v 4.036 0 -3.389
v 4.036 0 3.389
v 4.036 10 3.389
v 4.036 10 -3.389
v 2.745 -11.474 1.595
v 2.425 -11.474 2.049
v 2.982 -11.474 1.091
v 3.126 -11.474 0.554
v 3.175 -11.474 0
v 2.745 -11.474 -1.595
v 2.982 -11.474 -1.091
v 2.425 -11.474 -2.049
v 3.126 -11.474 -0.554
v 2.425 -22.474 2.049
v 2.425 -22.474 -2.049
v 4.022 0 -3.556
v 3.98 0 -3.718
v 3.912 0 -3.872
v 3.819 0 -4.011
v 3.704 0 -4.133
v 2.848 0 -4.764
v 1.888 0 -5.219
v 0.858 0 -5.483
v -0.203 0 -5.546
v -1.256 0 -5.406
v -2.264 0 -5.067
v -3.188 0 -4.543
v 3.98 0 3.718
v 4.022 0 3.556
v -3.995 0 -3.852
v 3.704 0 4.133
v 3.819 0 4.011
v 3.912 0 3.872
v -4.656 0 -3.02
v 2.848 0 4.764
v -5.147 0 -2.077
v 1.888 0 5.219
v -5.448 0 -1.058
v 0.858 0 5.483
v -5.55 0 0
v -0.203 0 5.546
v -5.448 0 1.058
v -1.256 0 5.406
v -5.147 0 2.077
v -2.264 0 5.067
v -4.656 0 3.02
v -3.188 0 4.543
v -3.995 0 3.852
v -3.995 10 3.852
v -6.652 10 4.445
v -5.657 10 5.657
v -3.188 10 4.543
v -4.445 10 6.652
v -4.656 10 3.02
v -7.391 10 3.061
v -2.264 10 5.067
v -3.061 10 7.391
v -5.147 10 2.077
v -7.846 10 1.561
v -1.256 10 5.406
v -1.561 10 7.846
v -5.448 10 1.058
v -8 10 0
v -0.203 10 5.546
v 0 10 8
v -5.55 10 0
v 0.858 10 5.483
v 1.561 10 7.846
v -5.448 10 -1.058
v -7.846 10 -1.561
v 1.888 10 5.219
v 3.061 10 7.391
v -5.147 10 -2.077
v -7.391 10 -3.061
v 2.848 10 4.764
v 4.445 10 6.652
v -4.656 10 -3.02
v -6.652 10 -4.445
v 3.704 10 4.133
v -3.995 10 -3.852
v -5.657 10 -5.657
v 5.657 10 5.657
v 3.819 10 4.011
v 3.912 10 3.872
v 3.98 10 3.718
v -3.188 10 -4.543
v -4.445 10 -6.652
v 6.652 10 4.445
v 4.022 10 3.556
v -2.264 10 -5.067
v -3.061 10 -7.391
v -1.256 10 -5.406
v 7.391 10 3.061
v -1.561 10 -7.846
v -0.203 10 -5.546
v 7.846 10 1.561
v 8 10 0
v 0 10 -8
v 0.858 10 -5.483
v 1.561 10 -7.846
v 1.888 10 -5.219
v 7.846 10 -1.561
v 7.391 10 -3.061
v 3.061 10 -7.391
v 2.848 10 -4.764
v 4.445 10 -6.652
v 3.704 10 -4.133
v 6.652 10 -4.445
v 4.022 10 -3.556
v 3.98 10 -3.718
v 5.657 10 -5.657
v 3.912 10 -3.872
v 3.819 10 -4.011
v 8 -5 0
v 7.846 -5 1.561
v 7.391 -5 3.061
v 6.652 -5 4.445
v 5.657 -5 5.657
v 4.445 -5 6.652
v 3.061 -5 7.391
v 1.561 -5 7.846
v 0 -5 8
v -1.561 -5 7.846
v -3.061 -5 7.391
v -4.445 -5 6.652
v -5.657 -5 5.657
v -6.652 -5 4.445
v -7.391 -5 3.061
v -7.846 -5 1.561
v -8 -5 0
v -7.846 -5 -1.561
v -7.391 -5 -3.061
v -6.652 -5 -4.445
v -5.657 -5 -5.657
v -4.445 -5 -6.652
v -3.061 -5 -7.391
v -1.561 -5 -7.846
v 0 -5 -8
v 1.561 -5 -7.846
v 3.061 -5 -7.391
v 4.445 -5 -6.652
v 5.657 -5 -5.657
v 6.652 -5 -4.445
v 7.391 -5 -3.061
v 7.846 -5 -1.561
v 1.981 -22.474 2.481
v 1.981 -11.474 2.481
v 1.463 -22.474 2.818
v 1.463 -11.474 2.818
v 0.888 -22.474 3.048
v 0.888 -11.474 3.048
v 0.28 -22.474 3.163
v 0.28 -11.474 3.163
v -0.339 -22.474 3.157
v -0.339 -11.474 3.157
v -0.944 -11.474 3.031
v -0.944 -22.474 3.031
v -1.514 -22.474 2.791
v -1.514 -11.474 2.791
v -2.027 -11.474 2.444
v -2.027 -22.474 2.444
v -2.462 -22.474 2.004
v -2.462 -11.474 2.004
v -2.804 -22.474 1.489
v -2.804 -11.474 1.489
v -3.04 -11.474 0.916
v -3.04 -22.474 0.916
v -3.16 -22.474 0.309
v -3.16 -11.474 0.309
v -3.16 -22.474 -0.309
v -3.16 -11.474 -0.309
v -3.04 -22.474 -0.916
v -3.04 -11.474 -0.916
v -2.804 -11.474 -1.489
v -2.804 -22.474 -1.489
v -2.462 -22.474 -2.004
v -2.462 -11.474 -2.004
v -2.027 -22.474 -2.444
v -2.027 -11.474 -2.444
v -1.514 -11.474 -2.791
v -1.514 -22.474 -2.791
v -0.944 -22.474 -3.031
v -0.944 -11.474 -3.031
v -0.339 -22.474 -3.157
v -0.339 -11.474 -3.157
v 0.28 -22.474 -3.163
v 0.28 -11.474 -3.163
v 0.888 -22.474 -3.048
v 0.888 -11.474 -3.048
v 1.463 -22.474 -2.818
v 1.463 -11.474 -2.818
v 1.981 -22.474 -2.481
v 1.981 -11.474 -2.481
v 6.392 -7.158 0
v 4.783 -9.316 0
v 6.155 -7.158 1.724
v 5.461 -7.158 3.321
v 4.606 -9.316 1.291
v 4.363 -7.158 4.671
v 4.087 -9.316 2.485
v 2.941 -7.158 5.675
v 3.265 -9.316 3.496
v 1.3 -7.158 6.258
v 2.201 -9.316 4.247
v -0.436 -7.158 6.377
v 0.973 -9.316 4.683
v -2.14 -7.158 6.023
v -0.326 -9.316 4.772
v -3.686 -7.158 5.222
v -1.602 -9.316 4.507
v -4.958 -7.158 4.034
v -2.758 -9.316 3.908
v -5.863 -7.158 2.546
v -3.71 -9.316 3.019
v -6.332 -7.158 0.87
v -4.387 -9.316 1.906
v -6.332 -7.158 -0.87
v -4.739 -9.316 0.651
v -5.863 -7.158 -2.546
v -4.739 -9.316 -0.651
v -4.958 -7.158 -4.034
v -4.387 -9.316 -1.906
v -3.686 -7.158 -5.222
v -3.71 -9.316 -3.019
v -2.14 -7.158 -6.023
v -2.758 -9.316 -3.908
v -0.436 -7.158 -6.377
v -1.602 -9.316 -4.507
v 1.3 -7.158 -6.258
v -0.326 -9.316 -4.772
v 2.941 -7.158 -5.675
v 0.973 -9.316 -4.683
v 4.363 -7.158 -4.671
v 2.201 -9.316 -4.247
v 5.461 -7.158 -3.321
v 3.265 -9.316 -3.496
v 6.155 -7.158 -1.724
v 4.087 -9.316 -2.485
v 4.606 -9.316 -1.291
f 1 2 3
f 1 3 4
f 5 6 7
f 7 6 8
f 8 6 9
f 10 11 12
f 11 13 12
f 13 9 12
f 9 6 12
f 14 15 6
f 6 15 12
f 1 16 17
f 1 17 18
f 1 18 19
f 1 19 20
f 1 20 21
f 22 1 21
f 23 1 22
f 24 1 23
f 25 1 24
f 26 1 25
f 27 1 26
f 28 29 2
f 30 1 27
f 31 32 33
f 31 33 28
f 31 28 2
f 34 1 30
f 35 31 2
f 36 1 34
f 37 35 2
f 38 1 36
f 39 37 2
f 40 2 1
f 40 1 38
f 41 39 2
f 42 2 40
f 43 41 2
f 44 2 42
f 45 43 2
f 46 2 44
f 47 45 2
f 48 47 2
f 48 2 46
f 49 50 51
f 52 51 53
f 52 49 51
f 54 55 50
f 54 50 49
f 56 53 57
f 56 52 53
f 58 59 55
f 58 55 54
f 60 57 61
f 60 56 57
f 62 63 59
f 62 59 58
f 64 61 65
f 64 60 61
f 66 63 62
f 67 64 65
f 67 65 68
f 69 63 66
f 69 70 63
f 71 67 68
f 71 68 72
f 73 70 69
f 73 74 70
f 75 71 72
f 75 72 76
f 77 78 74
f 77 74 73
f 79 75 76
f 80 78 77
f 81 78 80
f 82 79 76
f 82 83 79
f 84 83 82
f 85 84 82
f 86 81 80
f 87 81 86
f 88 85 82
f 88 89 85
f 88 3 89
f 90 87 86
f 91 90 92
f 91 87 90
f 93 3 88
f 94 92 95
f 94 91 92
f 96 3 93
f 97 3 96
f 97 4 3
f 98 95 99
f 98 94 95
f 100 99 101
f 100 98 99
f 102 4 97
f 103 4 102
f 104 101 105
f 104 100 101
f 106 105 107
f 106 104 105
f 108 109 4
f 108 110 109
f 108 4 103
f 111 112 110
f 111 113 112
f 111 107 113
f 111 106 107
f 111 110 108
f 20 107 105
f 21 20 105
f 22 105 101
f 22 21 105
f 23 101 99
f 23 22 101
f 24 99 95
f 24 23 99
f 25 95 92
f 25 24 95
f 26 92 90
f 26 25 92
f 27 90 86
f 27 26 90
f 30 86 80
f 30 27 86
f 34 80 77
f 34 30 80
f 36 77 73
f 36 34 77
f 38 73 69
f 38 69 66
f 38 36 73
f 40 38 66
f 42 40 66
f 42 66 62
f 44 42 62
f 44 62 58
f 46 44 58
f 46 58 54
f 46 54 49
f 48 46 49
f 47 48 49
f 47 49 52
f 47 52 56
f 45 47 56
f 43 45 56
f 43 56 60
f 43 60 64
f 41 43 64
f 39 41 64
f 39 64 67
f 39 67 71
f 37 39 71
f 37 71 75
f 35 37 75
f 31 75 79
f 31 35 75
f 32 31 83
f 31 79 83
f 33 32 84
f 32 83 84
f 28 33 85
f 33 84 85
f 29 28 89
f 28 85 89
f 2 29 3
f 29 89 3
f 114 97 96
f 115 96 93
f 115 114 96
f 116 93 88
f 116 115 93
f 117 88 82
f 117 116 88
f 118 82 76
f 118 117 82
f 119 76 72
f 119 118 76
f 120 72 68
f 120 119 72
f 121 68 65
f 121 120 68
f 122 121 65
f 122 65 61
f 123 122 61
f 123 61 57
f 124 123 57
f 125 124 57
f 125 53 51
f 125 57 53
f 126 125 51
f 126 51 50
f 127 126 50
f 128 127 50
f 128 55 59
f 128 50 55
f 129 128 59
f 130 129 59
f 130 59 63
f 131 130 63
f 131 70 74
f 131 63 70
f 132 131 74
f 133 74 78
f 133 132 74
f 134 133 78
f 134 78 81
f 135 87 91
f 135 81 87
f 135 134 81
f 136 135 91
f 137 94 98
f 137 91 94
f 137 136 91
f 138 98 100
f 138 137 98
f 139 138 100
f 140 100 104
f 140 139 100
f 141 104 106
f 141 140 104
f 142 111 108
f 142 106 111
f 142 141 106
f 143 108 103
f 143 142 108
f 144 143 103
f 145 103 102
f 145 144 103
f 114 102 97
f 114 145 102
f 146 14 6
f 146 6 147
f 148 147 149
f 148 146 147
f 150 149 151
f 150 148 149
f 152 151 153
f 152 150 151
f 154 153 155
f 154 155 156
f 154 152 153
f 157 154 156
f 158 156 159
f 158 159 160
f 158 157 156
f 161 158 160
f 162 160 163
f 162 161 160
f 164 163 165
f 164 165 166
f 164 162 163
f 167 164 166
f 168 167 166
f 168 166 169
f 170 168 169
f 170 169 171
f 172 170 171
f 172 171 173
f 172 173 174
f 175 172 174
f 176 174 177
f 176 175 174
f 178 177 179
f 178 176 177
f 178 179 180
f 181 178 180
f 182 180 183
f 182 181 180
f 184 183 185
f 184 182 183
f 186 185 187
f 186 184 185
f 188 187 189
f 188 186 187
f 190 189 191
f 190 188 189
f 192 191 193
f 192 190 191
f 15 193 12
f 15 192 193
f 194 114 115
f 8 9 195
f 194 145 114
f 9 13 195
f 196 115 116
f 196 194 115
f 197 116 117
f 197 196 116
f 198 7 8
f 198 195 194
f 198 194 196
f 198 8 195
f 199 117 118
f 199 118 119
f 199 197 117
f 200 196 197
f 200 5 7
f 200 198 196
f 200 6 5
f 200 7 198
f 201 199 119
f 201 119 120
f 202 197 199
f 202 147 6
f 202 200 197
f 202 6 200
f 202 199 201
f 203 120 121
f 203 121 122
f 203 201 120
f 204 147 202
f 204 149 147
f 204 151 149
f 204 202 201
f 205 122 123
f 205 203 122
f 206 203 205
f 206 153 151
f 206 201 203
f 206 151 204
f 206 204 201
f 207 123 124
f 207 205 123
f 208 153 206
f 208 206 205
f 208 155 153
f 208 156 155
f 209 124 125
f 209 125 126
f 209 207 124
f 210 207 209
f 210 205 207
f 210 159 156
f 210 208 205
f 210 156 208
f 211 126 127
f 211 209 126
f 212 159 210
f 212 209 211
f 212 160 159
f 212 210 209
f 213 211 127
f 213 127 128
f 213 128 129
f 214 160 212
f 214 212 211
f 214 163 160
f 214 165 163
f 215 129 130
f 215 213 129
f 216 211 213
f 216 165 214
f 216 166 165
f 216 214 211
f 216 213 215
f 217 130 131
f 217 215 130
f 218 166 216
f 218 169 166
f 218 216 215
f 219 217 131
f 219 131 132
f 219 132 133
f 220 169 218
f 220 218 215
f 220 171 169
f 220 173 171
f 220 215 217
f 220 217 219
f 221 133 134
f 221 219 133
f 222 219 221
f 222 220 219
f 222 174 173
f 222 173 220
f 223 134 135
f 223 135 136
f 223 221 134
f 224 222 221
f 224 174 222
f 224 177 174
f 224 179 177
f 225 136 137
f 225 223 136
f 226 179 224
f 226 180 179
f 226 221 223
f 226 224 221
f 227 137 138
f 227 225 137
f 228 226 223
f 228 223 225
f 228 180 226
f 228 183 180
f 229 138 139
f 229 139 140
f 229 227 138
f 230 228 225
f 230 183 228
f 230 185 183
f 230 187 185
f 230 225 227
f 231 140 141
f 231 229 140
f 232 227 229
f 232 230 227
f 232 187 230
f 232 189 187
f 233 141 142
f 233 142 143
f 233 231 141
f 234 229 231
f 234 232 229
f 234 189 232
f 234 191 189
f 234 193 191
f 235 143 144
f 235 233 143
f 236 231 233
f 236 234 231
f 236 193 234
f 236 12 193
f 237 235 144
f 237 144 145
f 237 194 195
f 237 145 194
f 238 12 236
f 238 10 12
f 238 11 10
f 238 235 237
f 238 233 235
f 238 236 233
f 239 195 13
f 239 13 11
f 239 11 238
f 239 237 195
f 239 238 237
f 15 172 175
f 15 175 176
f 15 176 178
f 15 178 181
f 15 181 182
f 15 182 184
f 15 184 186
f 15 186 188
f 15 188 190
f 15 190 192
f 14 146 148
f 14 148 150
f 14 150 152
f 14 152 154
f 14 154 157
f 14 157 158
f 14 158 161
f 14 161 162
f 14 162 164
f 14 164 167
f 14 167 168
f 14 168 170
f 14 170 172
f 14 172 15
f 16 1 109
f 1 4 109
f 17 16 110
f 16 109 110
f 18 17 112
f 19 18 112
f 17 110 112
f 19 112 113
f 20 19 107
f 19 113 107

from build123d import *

# Parameters (mm, degrees)
SKETCH1_R               = 8
BOSS_EXTRUDE1_DEPTH     = 10
CUT_EXTRUDE1_DEPTH      = 12
CUT_EXTRUDE1_DEPTH_BACK = 12
SKETCH3_W               = 0.75
SKETCH3_H               = 11
FILLET2_R               = 1
FILLET3_R               = 1


with BuildPart() as part:
    # Sketch1 → Boss-Extrude1 (new body)
    with BuildSketch(Plane(origin=(0, 0, 0), x_dir=(1, 0, 0), z_dir=(0, 1, 0))):
        Circle(SKETCH1_R)
        with BuildLine():
            Line((4.036363636, -0.000130644), (4.036363636, 3.809234647))
            ThreePointArc((4.036363636, 3.809234647), (-5.55, 0), (4.036363636, -3.809234647))
            Line((4.036363636, -3.809234647), (4.036363636, -0.000130644))
        make_face(mode=Mode.SUBTRACT)
    extrude(amount=BOSS_EXTRUDE1_DEPTH)

    # Sketch2 → Revolve1 (revolve)
    with BuildSketch(Plane.XY):
        Polygon((8, 0), (8, -5), (3.175, -11.473666382), (3.175, -22.473666382), (0, -22.473666382), (0, 0), align=None)
    revolve(axis=Axis((0, -22.473666382, 0), (0, -1, 0)))

    # Sketch3 → Cut-Extrude1 (cut, two sides: drawn at the far end of the back side and taken through both)
    with BuildSketch(Plane.XY.offset(-CUT_EXTRUDE1_DEPTH_BACK)):
        with Locations((2.8, -16.973666382)):
            Rectangle(SKETCH3_W, SKETCH3_H)
    extrude(amount=CUT_EXTRUDE1_DEPTH + CUT_EXTRUDE1_DEPTH_BACK, mode=Mode.SUBTRACT)

    # Fillet2
    fillet2_edges = [part.edges().sort_by_distance(p)[0] for p in [
        (4.036363636, 5, -3.809234647),
    ]]
    fillet(fillet2_edges, radius=FILLET2_R)

    # Fillet3
    fillet3_edges = [part.edges().sort_by_distance(p)[0] for p in [
        (4.036363636, 5, 3.809234647),
    ]]
    fillet(fillet3_edges, radius=FILLET3_R)


solid = part.part
